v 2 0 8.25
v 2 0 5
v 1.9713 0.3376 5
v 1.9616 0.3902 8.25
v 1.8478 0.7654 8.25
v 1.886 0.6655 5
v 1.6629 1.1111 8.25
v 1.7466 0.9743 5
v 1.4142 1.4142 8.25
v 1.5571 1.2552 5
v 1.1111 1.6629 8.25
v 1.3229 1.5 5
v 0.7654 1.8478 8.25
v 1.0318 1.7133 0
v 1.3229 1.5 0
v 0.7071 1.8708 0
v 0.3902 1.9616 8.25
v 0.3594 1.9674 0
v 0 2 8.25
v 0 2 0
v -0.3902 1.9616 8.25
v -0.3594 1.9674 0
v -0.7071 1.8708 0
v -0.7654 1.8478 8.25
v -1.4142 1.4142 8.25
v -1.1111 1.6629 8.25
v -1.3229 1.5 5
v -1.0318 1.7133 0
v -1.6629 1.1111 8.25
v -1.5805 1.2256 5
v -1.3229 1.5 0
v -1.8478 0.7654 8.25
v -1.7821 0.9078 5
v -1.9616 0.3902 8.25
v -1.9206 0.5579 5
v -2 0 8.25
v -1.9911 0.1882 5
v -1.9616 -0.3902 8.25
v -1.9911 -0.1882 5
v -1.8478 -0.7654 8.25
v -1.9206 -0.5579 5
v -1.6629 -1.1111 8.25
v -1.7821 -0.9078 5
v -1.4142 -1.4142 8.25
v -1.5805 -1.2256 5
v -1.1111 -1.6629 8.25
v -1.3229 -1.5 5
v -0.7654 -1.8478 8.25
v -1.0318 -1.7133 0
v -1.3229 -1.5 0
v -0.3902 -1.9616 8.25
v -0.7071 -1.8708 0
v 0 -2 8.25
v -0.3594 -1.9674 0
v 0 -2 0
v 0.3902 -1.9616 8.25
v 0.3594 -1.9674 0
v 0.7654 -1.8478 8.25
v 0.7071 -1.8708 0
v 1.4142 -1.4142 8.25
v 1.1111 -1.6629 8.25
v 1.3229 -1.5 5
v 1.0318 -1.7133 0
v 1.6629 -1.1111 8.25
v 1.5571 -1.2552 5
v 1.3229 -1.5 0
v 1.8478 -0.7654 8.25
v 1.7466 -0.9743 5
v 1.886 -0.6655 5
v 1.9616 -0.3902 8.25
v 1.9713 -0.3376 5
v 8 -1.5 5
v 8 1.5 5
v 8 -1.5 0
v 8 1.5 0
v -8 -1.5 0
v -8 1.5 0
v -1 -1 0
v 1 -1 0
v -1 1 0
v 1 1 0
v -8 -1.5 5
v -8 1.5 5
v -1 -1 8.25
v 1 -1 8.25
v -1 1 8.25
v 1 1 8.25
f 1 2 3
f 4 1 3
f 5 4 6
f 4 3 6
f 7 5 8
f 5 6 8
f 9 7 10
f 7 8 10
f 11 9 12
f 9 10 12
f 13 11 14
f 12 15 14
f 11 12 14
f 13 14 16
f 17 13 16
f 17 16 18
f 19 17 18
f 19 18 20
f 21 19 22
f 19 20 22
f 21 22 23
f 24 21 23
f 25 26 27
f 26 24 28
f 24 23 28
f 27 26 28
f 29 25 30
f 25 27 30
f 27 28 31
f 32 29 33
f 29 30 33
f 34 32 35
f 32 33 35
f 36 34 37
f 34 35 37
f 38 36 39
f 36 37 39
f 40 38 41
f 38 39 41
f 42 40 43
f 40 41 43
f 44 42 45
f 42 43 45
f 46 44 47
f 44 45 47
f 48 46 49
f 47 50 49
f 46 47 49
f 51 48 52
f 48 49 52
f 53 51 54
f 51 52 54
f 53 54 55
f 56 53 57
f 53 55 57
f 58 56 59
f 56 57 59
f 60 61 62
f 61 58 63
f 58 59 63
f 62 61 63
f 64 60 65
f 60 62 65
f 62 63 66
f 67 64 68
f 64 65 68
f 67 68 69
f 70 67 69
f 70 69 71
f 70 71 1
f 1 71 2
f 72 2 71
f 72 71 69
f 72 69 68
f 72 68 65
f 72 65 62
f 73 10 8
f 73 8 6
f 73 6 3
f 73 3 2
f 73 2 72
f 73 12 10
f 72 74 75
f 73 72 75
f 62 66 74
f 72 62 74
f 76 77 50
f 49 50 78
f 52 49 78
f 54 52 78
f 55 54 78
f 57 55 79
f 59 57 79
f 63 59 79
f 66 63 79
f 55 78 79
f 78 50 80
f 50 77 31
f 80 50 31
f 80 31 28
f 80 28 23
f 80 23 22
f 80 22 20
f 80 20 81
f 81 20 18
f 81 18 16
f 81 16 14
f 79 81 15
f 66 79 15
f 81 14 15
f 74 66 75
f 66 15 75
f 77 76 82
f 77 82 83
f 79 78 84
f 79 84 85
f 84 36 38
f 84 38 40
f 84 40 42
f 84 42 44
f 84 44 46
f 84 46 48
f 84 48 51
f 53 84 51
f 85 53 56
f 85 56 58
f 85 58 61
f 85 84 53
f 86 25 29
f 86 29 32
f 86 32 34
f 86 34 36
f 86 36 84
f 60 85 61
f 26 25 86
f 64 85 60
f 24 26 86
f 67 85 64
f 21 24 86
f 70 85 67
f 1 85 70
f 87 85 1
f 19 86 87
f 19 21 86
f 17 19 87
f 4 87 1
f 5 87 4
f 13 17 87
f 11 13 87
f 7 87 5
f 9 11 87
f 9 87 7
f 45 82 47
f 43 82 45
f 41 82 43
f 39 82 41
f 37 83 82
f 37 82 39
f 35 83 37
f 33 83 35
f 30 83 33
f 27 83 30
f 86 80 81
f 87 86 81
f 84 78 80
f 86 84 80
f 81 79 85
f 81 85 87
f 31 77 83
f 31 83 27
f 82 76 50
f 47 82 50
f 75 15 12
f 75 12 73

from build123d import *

# Parameters (mm, degrees)
BOX001_W       = 2
BOX001_H       = 2
BOX001_DEPTH   = 10
BOX_W          = 16
BOX_H          = 3
BOX_DEPTH      = 5
CYLINDER_R     = 2
CYLINDER_DEPTH = 8.25


with BuildPart() as cube001:
    # Box001 → Box001 (new body)
    with BuildSketch(Plane(origin=(-1, -1, 0), x_dir=(1, 0, 0), z_dir=(0, 0, 1))):
        with Locations((1, 1)):
            Rectangle(BOX001_W, BOX001_H)
    extrude(amount=BOX001_DEPTH)


with BuildPart() as cube:
    # Box → Box (new body)
    with BuildSketch(Plane(origin=(-8, -1.5, 0), x_dir=(1, 0, 0), z_dir=(0, 0, 1))):
        with Locations((8, 1.5)):
            Rectangle(BOX_W, BOX_H)
    extrude(amount=BOX_DEPTH)


with BuildPart() as cut:
    # Cylinder → Cylinder (new body)
    with BuildSketch(Plane.XY):
        Circle(CYLINDER_R)
    extrude(amount=CYLINDER_DEPTH)

    # Fusion: union Cube
    add(cube.part)

    # Cut: cut Cube001
    add(cube001.part, mode=Mode.SUBTRACT)


solid = cut.part
